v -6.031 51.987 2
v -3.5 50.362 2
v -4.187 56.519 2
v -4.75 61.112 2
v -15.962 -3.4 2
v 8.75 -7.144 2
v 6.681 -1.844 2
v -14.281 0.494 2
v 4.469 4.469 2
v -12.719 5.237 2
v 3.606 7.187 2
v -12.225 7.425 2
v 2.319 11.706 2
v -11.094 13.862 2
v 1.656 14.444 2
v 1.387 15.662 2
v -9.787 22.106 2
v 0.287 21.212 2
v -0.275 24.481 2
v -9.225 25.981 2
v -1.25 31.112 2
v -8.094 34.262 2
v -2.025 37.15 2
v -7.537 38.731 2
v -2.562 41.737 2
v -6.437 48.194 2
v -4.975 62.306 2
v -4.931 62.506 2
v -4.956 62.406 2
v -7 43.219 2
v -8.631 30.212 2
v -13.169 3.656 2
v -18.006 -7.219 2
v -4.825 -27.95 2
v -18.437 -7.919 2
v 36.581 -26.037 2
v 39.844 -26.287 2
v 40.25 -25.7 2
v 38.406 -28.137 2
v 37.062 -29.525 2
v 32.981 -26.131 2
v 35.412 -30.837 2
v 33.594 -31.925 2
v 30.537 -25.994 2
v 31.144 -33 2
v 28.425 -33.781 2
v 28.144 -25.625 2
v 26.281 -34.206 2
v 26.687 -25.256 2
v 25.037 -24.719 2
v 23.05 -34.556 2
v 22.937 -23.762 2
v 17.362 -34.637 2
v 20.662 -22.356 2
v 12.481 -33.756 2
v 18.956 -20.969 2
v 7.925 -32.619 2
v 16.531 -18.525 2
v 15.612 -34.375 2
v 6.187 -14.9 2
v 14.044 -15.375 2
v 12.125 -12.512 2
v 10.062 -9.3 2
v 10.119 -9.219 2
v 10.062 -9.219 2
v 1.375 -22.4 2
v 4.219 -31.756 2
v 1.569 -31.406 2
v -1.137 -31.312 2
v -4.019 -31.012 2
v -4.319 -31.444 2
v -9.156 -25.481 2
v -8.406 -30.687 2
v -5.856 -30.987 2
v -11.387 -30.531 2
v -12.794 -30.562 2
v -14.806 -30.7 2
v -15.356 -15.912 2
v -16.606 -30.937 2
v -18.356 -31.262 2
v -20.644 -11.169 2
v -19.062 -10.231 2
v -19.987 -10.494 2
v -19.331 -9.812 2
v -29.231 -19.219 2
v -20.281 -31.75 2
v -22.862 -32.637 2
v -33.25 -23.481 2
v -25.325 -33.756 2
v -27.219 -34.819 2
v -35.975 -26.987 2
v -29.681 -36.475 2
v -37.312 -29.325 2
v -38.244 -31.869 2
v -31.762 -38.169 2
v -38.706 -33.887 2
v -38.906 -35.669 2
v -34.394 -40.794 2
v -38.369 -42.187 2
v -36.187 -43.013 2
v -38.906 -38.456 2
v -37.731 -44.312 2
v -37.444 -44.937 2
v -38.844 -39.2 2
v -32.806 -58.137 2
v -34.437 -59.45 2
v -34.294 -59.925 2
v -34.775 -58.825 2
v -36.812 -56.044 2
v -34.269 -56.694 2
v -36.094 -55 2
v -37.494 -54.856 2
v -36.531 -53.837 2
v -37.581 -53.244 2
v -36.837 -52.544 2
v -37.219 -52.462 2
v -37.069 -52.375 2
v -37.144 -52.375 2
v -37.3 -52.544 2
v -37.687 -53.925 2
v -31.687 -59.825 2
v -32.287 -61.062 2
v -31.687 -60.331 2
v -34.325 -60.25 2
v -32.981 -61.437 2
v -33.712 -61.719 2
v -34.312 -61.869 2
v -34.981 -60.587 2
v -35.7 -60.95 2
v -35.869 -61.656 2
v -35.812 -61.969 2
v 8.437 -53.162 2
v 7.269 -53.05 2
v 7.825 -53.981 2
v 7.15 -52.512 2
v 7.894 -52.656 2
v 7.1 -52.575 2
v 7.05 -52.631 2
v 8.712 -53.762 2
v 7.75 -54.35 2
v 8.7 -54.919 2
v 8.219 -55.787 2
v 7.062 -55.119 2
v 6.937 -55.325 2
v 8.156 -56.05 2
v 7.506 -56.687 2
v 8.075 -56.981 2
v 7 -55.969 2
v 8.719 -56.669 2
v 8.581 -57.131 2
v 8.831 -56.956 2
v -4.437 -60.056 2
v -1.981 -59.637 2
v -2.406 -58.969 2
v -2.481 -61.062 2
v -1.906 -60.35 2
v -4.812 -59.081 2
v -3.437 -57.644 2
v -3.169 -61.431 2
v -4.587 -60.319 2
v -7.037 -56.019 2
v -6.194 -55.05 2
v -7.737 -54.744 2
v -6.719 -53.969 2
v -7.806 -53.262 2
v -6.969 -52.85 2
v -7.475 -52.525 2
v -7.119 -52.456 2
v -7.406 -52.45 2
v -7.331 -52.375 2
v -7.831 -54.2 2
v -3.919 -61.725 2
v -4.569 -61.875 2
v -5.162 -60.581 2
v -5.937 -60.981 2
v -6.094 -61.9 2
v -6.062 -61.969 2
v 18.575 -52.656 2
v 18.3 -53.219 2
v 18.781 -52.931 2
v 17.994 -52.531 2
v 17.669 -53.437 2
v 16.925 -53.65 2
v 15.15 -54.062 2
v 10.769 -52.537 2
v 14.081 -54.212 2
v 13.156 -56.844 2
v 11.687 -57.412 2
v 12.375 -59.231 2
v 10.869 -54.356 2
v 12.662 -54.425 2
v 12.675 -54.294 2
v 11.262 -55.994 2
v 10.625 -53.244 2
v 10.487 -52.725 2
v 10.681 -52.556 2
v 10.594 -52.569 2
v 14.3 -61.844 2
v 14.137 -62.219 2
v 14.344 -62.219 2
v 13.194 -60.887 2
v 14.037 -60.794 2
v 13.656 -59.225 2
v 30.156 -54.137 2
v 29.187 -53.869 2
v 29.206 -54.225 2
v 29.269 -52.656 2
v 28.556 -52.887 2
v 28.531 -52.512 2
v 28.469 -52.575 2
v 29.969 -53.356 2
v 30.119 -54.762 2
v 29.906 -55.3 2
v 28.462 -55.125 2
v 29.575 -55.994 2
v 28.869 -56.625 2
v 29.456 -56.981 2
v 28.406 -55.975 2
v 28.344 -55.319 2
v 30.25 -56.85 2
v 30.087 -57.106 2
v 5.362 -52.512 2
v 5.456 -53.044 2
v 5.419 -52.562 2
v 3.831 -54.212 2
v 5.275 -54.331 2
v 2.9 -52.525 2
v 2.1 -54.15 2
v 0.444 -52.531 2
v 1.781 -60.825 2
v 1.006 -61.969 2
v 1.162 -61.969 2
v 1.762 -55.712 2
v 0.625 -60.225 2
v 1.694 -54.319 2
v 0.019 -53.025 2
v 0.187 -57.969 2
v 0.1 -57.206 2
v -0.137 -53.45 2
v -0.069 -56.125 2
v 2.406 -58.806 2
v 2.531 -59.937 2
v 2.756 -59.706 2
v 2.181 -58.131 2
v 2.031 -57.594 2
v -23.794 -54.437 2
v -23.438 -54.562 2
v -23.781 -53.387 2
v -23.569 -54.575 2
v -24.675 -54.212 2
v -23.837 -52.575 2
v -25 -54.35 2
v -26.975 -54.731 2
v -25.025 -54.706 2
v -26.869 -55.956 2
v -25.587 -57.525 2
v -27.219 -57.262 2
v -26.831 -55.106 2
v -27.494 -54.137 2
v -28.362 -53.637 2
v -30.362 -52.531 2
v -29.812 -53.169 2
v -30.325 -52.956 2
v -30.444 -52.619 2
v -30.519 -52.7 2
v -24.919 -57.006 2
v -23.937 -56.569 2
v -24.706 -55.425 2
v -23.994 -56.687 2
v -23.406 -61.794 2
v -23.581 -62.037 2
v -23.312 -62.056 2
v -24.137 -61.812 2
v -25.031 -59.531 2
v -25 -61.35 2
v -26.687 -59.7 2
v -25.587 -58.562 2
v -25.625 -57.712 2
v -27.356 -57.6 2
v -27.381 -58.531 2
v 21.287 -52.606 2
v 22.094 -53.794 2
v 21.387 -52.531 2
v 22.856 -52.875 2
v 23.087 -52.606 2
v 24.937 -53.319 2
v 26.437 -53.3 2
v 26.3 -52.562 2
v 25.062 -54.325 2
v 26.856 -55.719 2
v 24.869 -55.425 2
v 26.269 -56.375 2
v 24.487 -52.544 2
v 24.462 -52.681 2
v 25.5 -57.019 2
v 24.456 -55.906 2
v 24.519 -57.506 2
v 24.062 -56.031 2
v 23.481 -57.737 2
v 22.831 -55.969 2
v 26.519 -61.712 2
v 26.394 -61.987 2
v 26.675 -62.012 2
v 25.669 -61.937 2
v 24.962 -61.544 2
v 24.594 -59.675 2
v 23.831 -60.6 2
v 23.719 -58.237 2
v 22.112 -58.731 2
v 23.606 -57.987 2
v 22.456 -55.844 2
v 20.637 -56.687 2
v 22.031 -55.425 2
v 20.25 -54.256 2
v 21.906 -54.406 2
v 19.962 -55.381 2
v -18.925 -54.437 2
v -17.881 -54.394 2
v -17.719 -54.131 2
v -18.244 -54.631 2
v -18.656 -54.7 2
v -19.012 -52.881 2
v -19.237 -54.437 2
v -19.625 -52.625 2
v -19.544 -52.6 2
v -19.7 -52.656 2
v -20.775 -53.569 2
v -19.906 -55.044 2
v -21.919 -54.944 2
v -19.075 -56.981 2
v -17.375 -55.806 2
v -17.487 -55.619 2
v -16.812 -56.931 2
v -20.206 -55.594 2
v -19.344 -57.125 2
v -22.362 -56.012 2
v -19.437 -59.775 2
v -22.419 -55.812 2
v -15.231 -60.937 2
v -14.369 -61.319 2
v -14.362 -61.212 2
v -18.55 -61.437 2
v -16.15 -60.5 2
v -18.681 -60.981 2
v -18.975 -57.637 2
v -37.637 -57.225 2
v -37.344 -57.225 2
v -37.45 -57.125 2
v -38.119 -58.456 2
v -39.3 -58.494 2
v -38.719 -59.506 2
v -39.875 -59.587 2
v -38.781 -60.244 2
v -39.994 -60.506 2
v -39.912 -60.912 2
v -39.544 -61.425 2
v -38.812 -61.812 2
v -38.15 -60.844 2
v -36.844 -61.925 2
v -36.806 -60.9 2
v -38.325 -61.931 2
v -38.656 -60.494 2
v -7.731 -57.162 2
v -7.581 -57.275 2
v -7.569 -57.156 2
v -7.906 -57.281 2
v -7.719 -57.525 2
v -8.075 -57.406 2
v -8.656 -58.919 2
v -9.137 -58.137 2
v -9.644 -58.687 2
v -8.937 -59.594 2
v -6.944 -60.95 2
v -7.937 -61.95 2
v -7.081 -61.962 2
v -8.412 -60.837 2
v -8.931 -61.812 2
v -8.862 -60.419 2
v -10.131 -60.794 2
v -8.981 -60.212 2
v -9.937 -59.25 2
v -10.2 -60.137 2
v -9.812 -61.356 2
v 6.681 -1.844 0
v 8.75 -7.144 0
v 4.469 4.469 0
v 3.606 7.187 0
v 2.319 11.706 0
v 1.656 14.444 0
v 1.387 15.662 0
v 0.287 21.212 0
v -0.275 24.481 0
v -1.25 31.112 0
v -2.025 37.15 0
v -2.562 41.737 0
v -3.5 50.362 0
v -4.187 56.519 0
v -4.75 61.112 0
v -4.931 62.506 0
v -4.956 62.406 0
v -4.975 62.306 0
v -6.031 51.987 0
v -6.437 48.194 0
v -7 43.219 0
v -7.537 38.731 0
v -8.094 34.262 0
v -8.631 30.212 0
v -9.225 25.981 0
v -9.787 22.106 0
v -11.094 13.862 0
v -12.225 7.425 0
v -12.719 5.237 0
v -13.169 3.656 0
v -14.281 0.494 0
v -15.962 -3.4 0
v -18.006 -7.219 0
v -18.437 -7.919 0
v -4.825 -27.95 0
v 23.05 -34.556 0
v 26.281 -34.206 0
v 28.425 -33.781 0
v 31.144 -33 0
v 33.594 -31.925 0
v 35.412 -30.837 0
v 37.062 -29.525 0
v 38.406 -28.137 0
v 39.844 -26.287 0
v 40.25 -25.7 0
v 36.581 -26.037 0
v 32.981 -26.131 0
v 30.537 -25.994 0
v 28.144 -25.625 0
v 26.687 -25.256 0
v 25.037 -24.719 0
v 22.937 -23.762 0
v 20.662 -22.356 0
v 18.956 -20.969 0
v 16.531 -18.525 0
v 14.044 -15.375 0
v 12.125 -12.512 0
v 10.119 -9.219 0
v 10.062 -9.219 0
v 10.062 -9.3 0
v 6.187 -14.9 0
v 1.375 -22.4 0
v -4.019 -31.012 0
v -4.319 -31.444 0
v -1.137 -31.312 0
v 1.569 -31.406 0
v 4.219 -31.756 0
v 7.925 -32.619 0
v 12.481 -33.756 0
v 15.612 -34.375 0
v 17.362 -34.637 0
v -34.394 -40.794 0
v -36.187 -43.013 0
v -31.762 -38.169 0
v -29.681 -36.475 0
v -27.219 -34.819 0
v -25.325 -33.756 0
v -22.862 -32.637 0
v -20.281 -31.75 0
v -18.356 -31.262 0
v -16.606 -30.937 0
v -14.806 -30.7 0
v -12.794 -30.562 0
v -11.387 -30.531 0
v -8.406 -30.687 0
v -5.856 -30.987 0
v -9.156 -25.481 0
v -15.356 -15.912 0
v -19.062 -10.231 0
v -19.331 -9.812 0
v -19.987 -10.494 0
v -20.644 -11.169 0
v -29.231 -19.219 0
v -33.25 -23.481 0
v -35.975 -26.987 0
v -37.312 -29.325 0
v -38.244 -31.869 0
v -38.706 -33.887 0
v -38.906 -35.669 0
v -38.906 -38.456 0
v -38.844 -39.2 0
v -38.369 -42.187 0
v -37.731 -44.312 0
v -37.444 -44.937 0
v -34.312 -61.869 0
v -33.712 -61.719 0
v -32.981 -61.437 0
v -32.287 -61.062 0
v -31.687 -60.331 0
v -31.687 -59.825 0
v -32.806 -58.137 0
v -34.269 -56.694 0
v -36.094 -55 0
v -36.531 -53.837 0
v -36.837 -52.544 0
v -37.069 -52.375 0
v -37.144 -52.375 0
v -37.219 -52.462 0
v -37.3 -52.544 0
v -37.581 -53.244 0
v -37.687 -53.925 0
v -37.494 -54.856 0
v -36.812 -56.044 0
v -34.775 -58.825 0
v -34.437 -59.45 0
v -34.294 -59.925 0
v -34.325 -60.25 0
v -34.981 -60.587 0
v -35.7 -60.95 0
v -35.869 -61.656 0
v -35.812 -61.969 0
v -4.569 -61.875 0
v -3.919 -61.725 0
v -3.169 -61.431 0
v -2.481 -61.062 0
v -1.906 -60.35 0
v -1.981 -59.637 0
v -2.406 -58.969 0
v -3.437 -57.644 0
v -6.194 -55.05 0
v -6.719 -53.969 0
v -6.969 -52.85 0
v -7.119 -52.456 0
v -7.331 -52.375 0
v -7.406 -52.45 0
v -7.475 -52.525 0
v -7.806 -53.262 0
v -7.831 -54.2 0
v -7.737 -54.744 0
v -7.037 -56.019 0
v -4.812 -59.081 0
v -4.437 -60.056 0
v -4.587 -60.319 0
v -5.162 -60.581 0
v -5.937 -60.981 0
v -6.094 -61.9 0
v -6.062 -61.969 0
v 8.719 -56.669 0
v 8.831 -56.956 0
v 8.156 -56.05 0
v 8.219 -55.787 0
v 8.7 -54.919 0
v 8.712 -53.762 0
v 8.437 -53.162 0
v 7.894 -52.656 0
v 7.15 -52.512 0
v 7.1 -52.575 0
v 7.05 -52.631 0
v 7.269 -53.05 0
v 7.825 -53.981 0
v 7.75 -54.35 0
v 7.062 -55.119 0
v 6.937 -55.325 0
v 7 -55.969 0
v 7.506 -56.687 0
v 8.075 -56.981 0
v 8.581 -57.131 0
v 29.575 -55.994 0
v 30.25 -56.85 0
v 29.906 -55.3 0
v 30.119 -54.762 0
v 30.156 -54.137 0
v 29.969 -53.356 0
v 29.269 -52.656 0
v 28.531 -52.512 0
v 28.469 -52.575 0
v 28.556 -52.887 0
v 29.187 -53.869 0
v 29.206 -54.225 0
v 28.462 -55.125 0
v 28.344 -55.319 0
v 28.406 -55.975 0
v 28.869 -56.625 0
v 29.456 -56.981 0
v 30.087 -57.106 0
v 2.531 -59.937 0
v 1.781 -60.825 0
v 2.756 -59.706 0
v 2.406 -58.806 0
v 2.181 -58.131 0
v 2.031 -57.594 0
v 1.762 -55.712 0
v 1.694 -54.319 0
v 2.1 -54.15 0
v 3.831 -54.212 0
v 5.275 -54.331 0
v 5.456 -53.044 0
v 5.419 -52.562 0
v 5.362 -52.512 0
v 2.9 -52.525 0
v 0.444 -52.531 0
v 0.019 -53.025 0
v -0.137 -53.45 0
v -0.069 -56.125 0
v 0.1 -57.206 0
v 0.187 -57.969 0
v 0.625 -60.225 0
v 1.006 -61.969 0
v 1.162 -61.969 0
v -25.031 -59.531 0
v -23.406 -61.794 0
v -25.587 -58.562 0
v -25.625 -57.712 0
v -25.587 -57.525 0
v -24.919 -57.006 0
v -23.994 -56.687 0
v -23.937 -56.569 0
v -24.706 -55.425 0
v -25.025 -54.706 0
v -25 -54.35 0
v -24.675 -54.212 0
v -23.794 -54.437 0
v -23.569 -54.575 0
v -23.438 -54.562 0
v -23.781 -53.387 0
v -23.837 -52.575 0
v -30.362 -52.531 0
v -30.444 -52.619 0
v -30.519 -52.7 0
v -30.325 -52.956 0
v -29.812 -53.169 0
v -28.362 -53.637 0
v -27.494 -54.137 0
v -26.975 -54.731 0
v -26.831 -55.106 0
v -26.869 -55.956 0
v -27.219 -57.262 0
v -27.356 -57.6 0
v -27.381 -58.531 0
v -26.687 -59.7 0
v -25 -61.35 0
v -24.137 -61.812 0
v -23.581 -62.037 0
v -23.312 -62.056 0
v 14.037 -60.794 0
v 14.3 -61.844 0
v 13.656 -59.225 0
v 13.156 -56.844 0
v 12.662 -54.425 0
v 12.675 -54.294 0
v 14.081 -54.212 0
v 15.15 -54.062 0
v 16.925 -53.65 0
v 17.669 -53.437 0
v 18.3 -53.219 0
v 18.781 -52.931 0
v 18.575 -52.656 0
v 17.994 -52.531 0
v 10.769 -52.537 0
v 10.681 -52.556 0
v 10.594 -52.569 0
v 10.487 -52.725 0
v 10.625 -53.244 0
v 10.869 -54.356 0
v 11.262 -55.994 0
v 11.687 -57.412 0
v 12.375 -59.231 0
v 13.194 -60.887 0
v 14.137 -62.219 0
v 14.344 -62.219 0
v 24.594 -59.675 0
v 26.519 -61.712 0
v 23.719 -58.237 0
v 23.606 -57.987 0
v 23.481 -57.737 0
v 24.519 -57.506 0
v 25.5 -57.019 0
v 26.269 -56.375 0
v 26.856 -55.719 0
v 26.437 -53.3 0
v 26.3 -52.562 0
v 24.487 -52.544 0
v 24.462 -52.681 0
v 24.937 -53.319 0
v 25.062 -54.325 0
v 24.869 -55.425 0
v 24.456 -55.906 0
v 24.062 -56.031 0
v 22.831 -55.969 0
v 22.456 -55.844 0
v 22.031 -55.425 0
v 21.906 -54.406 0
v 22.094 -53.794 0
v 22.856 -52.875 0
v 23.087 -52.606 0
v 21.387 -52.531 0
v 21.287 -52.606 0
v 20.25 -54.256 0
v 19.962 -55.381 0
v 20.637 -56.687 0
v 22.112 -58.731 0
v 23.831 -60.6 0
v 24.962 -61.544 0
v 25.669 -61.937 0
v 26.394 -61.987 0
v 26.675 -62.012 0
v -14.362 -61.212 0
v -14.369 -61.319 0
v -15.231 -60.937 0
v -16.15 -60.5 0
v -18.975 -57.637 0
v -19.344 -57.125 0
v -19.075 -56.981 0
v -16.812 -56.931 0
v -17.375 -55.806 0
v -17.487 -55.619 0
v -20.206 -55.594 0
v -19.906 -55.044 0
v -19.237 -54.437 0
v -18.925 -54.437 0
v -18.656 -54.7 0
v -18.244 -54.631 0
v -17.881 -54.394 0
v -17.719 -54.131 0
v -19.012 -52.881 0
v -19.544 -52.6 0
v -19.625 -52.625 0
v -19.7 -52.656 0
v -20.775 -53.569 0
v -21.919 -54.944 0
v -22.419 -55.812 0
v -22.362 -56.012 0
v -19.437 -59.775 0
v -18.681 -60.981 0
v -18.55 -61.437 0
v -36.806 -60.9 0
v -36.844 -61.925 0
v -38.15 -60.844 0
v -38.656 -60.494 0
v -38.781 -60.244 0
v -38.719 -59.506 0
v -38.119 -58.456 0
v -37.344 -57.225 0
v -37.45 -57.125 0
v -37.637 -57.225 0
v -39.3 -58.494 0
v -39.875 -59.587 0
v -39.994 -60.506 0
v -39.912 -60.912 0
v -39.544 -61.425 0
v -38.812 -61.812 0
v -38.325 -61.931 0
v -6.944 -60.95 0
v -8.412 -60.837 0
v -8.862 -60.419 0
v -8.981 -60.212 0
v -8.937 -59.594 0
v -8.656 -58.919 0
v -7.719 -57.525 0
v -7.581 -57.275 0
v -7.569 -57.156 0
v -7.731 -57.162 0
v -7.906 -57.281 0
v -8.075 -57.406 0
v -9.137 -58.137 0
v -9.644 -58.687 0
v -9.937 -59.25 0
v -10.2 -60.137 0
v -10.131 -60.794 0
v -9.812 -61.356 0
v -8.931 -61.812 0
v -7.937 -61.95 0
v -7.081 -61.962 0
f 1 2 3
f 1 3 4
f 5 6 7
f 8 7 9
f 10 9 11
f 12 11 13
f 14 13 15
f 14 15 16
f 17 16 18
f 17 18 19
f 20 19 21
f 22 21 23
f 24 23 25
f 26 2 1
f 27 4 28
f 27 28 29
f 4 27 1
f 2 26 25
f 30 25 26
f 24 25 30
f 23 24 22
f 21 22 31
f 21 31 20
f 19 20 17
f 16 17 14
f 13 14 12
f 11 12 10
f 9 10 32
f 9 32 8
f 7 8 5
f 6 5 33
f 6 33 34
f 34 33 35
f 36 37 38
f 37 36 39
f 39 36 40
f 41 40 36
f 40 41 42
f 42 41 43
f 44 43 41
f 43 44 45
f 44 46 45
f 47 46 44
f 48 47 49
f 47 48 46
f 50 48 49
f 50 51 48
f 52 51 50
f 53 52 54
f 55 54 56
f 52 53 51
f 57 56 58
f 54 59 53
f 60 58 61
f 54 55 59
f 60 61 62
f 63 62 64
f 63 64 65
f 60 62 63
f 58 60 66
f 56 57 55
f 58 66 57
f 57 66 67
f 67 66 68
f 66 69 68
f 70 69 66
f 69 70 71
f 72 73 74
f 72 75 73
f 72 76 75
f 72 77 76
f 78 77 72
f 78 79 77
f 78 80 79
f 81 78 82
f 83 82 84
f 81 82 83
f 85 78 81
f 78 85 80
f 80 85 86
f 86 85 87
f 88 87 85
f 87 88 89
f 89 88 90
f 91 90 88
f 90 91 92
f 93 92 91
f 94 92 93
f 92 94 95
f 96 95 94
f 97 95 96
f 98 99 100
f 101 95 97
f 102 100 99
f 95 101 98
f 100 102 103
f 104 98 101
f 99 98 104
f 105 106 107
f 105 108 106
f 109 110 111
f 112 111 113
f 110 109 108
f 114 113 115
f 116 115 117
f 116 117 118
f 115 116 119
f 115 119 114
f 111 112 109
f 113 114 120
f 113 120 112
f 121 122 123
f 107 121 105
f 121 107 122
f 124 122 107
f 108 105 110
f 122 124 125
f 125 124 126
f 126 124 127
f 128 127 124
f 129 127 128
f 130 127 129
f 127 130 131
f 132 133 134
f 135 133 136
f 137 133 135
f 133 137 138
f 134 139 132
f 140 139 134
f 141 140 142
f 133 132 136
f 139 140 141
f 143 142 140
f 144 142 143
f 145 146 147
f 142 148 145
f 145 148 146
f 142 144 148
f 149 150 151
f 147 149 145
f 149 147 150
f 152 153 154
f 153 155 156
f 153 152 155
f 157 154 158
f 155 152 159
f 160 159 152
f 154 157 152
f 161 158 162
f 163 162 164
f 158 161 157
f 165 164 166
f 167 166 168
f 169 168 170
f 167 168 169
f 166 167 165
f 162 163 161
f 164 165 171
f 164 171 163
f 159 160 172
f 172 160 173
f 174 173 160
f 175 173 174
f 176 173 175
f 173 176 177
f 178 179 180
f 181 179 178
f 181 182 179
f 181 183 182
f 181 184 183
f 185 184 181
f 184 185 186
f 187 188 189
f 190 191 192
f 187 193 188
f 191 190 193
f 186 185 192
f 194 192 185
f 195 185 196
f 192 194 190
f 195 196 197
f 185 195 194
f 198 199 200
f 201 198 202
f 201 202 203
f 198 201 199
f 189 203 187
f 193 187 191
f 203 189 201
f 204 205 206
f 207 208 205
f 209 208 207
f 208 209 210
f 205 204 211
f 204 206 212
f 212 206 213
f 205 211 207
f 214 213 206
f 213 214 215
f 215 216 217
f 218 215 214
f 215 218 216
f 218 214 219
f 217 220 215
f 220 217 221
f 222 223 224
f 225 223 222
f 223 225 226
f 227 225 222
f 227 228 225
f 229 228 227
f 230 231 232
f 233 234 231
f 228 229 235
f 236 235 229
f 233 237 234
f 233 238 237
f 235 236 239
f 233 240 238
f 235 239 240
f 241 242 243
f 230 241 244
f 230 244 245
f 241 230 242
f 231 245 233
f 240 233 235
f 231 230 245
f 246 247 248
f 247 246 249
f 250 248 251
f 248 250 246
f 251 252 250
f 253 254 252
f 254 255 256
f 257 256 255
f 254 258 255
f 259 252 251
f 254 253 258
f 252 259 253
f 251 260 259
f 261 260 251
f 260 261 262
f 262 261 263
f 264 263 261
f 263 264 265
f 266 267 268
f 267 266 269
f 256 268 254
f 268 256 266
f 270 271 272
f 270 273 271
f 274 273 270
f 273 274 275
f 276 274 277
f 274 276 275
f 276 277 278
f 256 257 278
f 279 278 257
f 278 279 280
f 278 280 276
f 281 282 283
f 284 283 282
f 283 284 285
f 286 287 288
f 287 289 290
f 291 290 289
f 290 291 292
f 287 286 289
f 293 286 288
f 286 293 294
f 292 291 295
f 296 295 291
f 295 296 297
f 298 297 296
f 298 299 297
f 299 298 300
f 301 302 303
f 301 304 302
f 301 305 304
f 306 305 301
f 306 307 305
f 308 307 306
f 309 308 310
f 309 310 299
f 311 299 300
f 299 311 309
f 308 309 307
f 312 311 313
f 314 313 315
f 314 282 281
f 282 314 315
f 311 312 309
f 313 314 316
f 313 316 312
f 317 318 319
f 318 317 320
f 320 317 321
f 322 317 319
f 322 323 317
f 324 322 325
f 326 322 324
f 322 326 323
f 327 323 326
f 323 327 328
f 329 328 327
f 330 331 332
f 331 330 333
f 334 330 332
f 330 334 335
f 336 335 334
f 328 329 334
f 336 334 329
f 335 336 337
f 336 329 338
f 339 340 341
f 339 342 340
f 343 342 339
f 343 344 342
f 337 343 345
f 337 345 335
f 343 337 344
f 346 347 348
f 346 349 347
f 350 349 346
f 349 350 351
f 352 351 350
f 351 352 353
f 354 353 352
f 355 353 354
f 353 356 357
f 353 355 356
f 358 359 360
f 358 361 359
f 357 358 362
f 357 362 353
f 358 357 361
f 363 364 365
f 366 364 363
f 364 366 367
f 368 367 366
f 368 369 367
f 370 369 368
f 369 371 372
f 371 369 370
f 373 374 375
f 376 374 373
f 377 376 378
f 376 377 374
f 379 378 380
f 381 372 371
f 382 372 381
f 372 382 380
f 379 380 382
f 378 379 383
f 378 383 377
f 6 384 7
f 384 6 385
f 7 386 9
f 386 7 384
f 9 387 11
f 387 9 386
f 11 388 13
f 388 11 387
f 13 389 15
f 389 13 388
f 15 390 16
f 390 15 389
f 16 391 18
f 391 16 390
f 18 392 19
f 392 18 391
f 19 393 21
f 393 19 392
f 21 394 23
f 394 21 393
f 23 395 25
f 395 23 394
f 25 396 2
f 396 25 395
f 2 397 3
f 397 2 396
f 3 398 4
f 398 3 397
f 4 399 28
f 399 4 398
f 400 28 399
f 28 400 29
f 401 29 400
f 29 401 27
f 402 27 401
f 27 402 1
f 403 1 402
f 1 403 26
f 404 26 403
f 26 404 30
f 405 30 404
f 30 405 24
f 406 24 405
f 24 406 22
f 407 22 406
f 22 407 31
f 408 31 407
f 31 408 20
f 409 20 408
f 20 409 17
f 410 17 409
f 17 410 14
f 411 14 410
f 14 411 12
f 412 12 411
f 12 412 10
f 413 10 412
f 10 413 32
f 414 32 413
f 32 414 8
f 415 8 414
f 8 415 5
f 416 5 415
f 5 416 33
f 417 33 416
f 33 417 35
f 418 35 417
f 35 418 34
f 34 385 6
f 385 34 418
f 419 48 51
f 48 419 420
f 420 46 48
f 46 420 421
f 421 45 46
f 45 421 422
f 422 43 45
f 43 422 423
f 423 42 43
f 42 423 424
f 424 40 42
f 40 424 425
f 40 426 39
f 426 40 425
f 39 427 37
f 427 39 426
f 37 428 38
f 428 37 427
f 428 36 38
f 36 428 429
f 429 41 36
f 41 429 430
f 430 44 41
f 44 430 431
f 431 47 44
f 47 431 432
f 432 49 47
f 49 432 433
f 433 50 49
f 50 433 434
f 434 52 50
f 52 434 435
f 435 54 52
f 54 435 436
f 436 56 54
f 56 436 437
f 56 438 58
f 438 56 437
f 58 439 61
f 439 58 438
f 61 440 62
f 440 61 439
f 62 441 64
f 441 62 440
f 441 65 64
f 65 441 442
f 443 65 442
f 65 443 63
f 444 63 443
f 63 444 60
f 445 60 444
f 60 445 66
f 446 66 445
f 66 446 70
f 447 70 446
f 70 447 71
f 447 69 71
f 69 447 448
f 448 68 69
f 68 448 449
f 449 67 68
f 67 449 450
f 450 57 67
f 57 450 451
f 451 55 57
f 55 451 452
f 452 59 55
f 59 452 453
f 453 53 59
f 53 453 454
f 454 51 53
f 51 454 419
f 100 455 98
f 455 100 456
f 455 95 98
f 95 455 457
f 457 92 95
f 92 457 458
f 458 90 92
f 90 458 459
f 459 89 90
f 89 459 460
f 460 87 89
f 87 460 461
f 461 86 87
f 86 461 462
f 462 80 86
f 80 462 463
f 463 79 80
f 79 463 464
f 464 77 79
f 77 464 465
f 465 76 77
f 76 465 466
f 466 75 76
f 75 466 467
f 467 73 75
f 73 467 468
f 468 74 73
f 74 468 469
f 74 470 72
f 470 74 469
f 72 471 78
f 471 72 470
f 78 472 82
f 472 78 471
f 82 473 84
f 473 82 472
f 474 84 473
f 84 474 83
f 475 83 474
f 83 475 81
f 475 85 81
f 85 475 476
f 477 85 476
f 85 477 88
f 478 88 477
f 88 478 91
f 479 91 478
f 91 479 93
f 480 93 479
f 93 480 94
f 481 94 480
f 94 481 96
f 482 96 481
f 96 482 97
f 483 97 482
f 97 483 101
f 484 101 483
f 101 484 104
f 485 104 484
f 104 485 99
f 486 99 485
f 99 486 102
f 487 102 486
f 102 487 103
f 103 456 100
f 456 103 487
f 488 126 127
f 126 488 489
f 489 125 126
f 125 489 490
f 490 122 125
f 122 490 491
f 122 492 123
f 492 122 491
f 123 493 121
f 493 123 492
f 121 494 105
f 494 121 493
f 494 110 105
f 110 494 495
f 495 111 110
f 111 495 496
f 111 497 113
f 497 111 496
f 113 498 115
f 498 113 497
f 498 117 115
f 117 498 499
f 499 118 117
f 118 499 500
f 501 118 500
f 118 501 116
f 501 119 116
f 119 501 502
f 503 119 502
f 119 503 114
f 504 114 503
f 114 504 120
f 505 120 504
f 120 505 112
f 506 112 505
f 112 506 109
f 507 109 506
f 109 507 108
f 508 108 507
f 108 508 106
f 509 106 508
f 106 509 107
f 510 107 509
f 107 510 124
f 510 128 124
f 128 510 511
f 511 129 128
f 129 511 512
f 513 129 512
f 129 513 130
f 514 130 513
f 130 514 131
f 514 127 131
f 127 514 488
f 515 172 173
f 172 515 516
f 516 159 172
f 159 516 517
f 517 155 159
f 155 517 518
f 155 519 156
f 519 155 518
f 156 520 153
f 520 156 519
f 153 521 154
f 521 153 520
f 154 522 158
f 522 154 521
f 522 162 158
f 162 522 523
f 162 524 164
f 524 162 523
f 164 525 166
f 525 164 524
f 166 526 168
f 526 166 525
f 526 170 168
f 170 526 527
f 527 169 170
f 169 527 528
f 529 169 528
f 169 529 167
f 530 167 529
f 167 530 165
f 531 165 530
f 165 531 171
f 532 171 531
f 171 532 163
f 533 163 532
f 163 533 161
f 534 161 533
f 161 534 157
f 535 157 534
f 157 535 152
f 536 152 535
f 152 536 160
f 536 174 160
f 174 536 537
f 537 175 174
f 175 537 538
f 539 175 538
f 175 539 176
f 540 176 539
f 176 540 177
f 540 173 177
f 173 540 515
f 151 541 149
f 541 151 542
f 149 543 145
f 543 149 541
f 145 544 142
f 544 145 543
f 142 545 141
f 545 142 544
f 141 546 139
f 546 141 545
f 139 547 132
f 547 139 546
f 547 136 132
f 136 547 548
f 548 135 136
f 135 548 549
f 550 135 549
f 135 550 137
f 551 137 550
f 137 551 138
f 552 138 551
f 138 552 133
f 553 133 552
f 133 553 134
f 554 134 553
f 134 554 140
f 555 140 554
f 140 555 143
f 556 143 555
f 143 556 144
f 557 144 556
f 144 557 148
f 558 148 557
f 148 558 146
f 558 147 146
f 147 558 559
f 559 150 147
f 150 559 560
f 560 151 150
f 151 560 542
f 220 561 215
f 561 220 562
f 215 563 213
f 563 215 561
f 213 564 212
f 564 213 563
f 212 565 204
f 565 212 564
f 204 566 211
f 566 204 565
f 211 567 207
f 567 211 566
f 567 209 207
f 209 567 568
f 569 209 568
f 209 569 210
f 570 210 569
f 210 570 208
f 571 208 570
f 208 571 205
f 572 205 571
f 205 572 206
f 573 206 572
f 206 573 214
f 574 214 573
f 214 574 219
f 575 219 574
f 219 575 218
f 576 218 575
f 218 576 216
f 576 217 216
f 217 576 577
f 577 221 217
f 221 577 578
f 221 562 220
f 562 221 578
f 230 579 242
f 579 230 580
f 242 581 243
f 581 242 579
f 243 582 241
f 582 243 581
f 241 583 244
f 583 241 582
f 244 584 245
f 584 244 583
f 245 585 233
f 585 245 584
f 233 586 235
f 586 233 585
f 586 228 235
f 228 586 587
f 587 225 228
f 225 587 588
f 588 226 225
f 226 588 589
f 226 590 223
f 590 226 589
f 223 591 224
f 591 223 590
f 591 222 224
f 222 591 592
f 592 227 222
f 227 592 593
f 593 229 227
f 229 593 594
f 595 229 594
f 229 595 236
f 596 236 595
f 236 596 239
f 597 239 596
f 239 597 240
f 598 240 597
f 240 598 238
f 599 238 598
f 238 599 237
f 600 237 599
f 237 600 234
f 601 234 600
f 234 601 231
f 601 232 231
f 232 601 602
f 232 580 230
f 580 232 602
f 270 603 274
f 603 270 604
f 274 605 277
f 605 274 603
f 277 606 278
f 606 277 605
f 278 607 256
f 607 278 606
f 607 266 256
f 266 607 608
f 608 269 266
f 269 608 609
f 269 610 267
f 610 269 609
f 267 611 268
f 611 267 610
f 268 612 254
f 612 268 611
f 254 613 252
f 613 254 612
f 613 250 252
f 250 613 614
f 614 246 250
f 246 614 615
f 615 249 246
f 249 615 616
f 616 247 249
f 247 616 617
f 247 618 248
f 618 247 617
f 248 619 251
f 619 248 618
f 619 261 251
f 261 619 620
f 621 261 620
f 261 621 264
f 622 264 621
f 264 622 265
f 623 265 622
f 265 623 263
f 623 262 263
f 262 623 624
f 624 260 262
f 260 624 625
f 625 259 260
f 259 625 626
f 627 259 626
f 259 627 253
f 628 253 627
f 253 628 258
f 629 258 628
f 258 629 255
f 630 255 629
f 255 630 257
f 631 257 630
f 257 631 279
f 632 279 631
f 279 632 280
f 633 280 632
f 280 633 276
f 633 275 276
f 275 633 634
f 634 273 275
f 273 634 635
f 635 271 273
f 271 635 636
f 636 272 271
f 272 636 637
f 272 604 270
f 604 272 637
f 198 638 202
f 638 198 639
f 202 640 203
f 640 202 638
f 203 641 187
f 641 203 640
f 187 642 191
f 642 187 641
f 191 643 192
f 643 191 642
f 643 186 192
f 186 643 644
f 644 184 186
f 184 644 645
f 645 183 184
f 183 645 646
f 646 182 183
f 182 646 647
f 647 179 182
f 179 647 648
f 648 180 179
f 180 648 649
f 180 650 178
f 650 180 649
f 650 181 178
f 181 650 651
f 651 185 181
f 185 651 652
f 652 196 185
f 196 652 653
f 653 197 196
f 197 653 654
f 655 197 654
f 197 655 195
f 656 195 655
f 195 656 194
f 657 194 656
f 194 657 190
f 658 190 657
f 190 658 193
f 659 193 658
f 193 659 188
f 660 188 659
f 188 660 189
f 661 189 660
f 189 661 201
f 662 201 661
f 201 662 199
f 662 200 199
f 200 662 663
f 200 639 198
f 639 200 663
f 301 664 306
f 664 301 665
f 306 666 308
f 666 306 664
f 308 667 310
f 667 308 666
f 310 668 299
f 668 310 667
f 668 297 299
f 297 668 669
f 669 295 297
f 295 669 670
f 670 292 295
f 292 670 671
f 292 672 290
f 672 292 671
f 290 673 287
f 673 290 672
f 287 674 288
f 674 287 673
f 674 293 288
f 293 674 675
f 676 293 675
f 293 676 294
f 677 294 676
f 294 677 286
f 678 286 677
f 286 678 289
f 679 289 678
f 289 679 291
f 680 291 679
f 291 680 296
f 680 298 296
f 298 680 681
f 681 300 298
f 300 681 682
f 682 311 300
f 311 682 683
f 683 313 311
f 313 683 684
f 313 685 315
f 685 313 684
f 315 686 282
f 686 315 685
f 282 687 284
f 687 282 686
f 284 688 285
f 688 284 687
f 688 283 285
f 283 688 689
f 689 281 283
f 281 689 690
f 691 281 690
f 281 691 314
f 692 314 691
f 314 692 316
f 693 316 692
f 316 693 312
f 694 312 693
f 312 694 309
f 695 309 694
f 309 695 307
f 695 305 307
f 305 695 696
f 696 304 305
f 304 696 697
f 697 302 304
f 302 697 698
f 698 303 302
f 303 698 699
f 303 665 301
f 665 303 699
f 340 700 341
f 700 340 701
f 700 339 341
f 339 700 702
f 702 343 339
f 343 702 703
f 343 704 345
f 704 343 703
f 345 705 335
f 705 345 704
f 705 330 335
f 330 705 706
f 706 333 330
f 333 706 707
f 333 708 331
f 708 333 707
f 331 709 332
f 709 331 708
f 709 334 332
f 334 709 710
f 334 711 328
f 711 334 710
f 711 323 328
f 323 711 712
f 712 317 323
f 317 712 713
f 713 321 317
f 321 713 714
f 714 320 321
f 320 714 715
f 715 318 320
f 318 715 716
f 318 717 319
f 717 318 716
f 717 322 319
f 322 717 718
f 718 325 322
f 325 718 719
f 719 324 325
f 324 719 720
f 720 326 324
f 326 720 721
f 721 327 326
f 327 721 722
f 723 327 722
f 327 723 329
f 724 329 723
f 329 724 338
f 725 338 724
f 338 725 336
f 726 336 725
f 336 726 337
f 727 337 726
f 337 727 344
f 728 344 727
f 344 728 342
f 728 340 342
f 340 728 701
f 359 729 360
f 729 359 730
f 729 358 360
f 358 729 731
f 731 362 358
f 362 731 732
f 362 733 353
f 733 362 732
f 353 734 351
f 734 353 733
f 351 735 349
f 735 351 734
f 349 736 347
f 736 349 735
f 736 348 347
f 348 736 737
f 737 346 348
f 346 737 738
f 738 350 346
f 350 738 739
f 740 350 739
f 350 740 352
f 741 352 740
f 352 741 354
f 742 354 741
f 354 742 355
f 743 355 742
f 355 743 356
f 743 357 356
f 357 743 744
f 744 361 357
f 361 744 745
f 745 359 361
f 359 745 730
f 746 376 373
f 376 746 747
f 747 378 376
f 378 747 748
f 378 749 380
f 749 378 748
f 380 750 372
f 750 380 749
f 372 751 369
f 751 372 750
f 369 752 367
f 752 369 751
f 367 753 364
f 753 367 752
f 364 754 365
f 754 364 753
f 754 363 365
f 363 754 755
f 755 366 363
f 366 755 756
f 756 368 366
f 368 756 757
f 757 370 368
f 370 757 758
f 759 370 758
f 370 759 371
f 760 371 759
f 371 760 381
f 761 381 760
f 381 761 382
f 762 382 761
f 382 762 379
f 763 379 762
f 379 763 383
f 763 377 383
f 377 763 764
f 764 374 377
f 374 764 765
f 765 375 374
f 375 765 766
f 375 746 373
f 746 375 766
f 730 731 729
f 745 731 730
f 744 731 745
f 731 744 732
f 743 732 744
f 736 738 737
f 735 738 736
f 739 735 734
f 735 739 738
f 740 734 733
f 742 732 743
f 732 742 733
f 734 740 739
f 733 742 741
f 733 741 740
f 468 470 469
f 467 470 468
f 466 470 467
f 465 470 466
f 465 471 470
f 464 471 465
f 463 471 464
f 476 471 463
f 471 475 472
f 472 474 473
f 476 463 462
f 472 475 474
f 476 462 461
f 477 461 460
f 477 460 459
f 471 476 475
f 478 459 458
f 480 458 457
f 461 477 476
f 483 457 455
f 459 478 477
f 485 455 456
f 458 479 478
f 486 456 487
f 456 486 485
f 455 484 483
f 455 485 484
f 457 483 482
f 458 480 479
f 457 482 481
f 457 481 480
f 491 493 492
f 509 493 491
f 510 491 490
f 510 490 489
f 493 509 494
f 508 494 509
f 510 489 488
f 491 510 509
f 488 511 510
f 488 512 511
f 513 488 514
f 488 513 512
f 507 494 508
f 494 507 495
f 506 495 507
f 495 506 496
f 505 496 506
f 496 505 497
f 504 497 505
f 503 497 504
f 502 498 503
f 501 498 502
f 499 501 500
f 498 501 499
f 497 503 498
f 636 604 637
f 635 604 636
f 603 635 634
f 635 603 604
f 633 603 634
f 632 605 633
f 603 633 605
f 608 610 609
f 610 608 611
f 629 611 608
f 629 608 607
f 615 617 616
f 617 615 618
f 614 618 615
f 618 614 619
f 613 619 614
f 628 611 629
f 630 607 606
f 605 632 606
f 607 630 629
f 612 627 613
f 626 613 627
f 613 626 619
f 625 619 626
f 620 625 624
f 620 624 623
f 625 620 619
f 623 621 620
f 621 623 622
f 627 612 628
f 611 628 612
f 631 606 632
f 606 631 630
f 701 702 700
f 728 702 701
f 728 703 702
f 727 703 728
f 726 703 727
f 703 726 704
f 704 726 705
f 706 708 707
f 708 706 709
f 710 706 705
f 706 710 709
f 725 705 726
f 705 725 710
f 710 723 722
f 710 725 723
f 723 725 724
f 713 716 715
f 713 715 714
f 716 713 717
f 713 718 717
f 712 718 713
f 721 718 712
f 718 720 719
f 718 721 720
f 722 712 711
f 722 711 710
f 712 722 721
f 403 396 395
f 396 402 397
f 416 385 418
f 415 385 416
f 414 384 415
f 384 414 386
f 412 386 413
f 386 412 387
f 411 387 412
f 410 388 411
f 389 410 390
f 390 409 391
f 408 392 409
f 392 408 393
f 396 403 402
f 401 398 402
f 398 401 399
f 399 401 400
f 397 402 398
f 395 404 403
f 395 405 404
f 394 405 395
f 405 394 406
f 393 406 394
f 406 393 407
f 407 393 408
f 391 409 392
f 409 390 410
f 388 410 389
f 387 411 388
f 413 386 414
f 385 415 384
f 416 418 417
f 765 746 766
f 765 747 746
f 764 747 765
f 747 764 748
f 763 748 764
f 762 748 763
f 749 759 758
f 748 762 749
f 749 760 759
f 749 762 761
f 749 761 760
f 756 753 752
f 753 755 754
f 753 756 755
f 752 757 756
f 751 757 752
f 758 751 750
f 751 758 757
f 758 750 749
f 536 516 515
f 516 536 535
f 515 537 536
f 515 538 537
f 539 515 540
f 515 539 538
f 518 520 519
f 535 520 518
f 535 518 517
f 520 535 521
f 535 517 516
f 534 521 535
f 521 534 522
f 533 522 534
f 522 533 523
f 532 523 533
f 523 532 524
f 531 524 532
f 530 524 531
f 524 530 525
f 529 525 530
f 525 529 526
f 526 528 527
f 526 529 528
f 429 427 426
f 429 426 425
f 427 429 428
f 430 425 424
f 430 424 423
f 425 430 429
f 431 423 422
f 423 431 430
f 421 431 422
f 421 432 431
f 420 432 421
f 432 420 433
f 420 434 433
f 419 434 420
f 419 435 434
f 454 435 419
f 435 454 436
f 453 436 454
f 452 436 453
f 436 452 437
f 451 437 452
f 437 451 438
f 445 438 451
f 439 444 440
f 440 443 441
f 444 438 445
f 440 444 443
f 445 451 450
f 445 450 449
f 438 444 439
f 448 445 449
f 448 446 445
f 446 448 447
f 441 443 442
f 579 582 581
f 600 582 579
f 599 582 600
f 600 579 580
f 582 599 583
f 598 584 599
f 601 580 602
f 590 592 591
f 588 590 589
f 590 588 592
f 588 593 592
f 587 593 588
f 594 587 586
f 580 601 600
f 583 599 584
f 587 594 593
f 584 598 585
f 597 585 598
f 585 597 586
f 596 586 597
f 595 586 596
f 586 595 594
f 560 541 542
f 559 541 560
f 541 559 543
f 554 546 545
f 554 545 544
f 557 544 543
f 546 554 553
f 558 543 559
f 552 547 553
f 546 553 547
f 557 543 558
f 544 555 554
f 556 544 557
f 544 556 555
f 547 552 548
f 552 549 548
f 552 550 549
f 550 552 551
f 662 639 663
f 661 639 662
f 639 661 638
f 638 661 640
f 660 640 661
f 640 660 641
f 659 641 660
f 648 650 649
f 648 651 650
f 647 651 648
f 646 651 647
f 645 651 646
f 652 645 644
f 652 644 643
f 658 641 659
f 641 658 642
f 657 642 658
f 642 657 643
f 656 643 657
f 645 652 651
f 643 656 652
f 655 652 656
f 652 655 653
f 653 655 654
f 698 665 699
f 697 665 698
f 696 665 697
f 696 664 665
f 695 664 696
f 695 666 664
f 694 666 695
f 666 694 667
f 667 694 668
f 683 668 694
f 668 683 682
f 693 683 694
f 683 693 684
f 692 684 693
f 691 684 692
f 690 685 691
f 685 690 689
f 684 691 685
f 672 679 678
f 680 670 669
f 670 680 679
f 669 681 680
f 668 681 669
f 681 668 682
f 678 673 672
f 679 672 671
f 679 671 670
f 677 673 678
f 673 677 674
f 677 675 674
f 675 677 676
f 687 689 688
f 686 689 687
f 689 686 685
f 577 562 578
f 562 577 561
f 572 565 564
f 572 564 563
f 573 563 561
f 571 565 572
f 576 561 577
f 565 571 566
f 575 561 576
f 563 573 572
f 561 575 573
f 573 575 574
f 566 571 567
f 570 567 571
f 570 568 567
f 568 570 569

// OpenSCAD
module d5fd3b5140cd74a1ab926094f52e11e8_1()
{
 /* Generated by trace2scad version 20150415
    http://aggregate.org/MAKE/TRACE2SCAD/
    Optimized model has 387/4796 original points
 */
 color([0.48, 0.48, 0.48])
 assign(minx=0) /* polygon minx=39 */
 assign(miny=0) /* polygon miny=45 */
 assign(maxx=12880) /* polygon maxx=12880 */
 assign(maxy=20000) /* polygon maxy=20001 */
 assign(dx=maxx-minx)
 assign(dy=maxy-miny)
 assign(maxd=((dx>dy)?dx:dy))
 scale([1/maxd, 1/maxd, 1])
 translate([-minx-dx/2, -miny-dy/2, 0])
 linear_extrude(height=1, convexity=387)
 union() {
  union() {
   polygon([[5647,19985],[5644,19969],[5475,18318],[5410,17711],[5320,16915],[5234,16197],[5145,15482],[5059,14834],[4964,14157],[4874,13537],[4665,12218],[4484,11188],[4405,10838],[4333,10585],[4155,10079],[3886,9456],[3559,8845],[3490,8733],[5668,5528],[7840,8857],[7509,9705],[7155,10715],[7017,11150],[6811,11873],[6705,12311],[6662,12506],[6486,13394],[6396,13917],[6240,14978],[6116,15944],[6030,16678],[5880,18058],[5770,19043],[5680,19778],[5651,20001]], convexity=6);
   polygon([[8050,8518],[8050,8512],[7430,7616],[6660,6416],[5797,5038],[5749,4969],[6258,4990],[6691,4975],[7115,4919],[7708,4781],[8437,4599],[8938,4500],[9218,4458],[10128,4471],[10645,4527],[10988,4595],[11423,4720],[11815,4892],[12106,5066],[12370,5276],[12585,5498],[12815,5794],[12880,5888],[12293,5834],[11717,5819],[11326,5841],[10943,5900],[10710,5959],[10446,6045],[10110,6198],[9746,6423],[9473,6645],[9085,7036],[8687,7540],[8380,7998],[8059,8525],[8050,8525]], convexity=9);
   polygon([[3242,8321],[3137,8213],[1763,6925],[1120,6243],[684,5682],[470,5308],[321,4901],[247,4578],[215,4293],[215,3847],[225,3728],[301,3250],[403,2910],[449,2810],[650,3118],[937,3473],[1358,3893],[1691,4164],[2085,4429],[2388,4599],[2782,4778],[3195,4920],[3503,4998],[3783,5050],[4071,5088],[4393,5110],[4618,5115],[5095,5090],[5503,5042],[4975,5923],[3983,7454],[3390,8363],[3347,8430]], convexity=7);
   polygon([[485,1606],[472,1593],[427,1481],[410,1372],[441,1223],[550,1033],[876,588],[930,488],[953,412],[948,360],[843,306],[728,248],[701,135],[710,85],[950,101],[1046,125],[1163,170],[1274,230],[1370,347],[1370,428],[1191,698],[957,929],[665,1200],[595,1386],[546,1593],[509,1620],[497,1620]], convexity=8);
   polygon([[5255,1608],[5244,1596],[5191,1478],[5187,1328],[5202,1241],[5314,1037],[5670,547],[5730,391],[5706,349],[5614,307],[5490,243],[5465,96],[5470,85],[5709,100],[5813,124],[5933,171],[6043,230],[6135,344],[6123,458],[6055,565],[5890,777],[5449,1192],[5365,1365],[5325,1544],[5301,1607],[5267,1620]], convexity=8);
   polygon([[6904,1596],[6511,1595],[6443,1516],[6418,1448],[6429,1020],[6456,847],[6470,725],[6540,364],[6601,85],[6626,85],[6725,268],[6845,410],[6881,447],[6825,591],[6789,699],[6765,785],[6722,1086],[6711,1309],[6776,1336],[7053,1326],[7284,1307],[7313,1513],[7307,1590],[7298,1598]], convexity=10);
   polygon([[7576,1588],[7568,1579],[7603,1512],[7692,1363],[7680,1304],[7570,1181],[7550,1148],[7560,1045],[7641,930],[7732,883],[7813,859],[7853,887],[7835,933],[7745,1032],[7755,1074],[7832,1213],[7834,1398],[7790,1494],[7703,1575],[7584,1598]], convexity=10);
   polygon([[11000,1593],[10995,1588],[11009,1538],[11110,1381],[11113,1324],[10994,1180],[10975,1149],[10985,1044],[11059,940],[11153,883],[11254,863],[11280,904],[11172,1041],[11225,1152],[11259,1238],[11265,1338],[11235,1463],[11123,1575],[11005,1598]], convexity=10);
   polygon([[1569,1581],[1557,1568],[1588,1527],[1670,1493],[1902,1418],[2041,1338],[2124,1243],[2147,1183],[2141,1047],[2085,838],[2063,784],[2059,635],[2170,448],[2440,184],[2578,110],[2667,74],[2710,71],[2695,113],[2435,475],[2346,630],[2340,766],[2346,796],[2453,879],[2601,930],[2610,949],[2487,1132],[2436,1247],[2440,1304],[2492,1326],[2633,1290],[2669,1268],[2690,1270],[2635,1458],[2626,1588],[1582,1595]], convexity=13);
   polygon([[8149,1591],[8135,1589],[8118,1564],[8140,1481],[8179,1303],[8242,1041],[8310,814],[8420,523],[8551,258],[8702,45],[8735,45],[8728,105],[8686,273],[8625,524],[8545,905],[8466,1292],[8468,1313],[8693,1326],[8864,1350],[9148,1416],[9267,1450],[9368,1485],[9445,1531],[9412,1575],[9319,1595],[8163,1594]], convexity=9);
   polygon([[9854,1589],[9846,1583],[9680,1319],[9634,1139],[9742,930],[9978,603],[10253,304],[10434,153],[10547,90],[10663,82],[10708,78],[10683,126],[10375,452],[10235,682],[10217,722],[10197,762],[10363,799],[10520,877],[10643,980],[10737,1085],[10670,1472],[10648,1590],[10358,1593],[10354,1571],[10430,1469],[10450,1308],[10419,1132],[10353,1055],[10290,1035],[10093,1045],[10033,1065],[9965,1132],[9945,1295],[9975,1393],[10097,1540],[10134,1583],[9862,1595]], convexity=13);
   polygon([[3300,1580],[3288,1575],[3116,1429],[2933,1209],[2853,1070],[2862,1038],[3330,436],[3451,243],[3472,170],[4141,189],[4142,206],[4003,250],[3856,320],[3404,778],[3345,860],[3388,883],[3750,891],[3660,1071],[3642,1101],[3207,1105],[3255,1193],[3362,1290],[3412,1290],[3455,1248],[3521,1259],[3579,1297],[3605,1339],[3398,1539],[3313,1584]], convexity=12);
   polygon([[433,852],[418,844],[152,641],[60,466],[41,319],[54,254],[113,172],[230,110],[308,91],[545,92],[551,256],[336,265],[255,321],[235,361],[245,479],[341,647],[465,844],[448,860]], convexity=8);
   polygon([[5175,835],[5148,815],[4978,698],[4897,610],[4850,520],[4808,378],[4819,273],[4870,183],[5011,110],[5170,88],[5307,86],[5329,248],[5094,266],[5022,333],[5003,366],[5010,465],[5055,573],[5205,796],[5227,836],[5229,855],[5203,854]], convexity=8);
  }
 }
}

module d5fd3b5140cd74a1ab926094f52e11e8()
{
 /* all layers combined, scaled to within a 1mm cube */
 scale([1, 1, 1/1])
 difference() {
  union() {
   scale([1,1,2]) translate([0,0,-0.5]) d5fd3b5140cd74a1ab926094f52e11e8_1();
  }
  translate([0,0,-2]) cube([2,2,4],center=true);
 }
}

scale([125, 125, 2]) {
	d5fd3b5140cd74a1ab926094f52e11e8();
}
